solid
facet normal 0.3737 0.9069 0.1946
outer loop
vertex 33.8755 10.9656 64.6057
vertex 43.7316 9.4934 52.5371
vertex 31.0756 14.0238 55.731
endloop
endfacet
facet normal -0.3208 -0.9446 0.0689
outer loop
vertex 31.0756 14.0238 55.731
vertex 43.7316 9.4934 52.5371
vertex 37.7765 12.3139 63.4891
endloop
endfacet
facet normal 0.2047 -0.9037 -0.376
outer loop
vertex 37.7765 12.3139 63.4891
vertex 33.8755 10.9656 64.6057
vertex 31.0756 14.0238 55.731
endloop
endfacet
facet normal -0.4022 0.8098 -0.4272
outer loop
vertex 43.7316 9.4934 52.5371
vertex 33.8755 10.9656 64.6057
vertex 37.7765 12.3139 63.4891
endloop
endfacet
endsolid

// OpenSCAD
// Auto-generated auxetic polyhedron
points = [
    [31.075553, 14.023829, 55.730979],
    [43.731645, 9.493391, 52.537112],
    [33.875506, 10.965567, 64.605739],
    [37.776515, 12.313852, 63.489149],
];

faces = [
    [0, 1, 2],
    [3, 1, 0],
    [0, 2, 3],
    [3, 2, 1],
];

polyhedron(points = points, faces = faces);
